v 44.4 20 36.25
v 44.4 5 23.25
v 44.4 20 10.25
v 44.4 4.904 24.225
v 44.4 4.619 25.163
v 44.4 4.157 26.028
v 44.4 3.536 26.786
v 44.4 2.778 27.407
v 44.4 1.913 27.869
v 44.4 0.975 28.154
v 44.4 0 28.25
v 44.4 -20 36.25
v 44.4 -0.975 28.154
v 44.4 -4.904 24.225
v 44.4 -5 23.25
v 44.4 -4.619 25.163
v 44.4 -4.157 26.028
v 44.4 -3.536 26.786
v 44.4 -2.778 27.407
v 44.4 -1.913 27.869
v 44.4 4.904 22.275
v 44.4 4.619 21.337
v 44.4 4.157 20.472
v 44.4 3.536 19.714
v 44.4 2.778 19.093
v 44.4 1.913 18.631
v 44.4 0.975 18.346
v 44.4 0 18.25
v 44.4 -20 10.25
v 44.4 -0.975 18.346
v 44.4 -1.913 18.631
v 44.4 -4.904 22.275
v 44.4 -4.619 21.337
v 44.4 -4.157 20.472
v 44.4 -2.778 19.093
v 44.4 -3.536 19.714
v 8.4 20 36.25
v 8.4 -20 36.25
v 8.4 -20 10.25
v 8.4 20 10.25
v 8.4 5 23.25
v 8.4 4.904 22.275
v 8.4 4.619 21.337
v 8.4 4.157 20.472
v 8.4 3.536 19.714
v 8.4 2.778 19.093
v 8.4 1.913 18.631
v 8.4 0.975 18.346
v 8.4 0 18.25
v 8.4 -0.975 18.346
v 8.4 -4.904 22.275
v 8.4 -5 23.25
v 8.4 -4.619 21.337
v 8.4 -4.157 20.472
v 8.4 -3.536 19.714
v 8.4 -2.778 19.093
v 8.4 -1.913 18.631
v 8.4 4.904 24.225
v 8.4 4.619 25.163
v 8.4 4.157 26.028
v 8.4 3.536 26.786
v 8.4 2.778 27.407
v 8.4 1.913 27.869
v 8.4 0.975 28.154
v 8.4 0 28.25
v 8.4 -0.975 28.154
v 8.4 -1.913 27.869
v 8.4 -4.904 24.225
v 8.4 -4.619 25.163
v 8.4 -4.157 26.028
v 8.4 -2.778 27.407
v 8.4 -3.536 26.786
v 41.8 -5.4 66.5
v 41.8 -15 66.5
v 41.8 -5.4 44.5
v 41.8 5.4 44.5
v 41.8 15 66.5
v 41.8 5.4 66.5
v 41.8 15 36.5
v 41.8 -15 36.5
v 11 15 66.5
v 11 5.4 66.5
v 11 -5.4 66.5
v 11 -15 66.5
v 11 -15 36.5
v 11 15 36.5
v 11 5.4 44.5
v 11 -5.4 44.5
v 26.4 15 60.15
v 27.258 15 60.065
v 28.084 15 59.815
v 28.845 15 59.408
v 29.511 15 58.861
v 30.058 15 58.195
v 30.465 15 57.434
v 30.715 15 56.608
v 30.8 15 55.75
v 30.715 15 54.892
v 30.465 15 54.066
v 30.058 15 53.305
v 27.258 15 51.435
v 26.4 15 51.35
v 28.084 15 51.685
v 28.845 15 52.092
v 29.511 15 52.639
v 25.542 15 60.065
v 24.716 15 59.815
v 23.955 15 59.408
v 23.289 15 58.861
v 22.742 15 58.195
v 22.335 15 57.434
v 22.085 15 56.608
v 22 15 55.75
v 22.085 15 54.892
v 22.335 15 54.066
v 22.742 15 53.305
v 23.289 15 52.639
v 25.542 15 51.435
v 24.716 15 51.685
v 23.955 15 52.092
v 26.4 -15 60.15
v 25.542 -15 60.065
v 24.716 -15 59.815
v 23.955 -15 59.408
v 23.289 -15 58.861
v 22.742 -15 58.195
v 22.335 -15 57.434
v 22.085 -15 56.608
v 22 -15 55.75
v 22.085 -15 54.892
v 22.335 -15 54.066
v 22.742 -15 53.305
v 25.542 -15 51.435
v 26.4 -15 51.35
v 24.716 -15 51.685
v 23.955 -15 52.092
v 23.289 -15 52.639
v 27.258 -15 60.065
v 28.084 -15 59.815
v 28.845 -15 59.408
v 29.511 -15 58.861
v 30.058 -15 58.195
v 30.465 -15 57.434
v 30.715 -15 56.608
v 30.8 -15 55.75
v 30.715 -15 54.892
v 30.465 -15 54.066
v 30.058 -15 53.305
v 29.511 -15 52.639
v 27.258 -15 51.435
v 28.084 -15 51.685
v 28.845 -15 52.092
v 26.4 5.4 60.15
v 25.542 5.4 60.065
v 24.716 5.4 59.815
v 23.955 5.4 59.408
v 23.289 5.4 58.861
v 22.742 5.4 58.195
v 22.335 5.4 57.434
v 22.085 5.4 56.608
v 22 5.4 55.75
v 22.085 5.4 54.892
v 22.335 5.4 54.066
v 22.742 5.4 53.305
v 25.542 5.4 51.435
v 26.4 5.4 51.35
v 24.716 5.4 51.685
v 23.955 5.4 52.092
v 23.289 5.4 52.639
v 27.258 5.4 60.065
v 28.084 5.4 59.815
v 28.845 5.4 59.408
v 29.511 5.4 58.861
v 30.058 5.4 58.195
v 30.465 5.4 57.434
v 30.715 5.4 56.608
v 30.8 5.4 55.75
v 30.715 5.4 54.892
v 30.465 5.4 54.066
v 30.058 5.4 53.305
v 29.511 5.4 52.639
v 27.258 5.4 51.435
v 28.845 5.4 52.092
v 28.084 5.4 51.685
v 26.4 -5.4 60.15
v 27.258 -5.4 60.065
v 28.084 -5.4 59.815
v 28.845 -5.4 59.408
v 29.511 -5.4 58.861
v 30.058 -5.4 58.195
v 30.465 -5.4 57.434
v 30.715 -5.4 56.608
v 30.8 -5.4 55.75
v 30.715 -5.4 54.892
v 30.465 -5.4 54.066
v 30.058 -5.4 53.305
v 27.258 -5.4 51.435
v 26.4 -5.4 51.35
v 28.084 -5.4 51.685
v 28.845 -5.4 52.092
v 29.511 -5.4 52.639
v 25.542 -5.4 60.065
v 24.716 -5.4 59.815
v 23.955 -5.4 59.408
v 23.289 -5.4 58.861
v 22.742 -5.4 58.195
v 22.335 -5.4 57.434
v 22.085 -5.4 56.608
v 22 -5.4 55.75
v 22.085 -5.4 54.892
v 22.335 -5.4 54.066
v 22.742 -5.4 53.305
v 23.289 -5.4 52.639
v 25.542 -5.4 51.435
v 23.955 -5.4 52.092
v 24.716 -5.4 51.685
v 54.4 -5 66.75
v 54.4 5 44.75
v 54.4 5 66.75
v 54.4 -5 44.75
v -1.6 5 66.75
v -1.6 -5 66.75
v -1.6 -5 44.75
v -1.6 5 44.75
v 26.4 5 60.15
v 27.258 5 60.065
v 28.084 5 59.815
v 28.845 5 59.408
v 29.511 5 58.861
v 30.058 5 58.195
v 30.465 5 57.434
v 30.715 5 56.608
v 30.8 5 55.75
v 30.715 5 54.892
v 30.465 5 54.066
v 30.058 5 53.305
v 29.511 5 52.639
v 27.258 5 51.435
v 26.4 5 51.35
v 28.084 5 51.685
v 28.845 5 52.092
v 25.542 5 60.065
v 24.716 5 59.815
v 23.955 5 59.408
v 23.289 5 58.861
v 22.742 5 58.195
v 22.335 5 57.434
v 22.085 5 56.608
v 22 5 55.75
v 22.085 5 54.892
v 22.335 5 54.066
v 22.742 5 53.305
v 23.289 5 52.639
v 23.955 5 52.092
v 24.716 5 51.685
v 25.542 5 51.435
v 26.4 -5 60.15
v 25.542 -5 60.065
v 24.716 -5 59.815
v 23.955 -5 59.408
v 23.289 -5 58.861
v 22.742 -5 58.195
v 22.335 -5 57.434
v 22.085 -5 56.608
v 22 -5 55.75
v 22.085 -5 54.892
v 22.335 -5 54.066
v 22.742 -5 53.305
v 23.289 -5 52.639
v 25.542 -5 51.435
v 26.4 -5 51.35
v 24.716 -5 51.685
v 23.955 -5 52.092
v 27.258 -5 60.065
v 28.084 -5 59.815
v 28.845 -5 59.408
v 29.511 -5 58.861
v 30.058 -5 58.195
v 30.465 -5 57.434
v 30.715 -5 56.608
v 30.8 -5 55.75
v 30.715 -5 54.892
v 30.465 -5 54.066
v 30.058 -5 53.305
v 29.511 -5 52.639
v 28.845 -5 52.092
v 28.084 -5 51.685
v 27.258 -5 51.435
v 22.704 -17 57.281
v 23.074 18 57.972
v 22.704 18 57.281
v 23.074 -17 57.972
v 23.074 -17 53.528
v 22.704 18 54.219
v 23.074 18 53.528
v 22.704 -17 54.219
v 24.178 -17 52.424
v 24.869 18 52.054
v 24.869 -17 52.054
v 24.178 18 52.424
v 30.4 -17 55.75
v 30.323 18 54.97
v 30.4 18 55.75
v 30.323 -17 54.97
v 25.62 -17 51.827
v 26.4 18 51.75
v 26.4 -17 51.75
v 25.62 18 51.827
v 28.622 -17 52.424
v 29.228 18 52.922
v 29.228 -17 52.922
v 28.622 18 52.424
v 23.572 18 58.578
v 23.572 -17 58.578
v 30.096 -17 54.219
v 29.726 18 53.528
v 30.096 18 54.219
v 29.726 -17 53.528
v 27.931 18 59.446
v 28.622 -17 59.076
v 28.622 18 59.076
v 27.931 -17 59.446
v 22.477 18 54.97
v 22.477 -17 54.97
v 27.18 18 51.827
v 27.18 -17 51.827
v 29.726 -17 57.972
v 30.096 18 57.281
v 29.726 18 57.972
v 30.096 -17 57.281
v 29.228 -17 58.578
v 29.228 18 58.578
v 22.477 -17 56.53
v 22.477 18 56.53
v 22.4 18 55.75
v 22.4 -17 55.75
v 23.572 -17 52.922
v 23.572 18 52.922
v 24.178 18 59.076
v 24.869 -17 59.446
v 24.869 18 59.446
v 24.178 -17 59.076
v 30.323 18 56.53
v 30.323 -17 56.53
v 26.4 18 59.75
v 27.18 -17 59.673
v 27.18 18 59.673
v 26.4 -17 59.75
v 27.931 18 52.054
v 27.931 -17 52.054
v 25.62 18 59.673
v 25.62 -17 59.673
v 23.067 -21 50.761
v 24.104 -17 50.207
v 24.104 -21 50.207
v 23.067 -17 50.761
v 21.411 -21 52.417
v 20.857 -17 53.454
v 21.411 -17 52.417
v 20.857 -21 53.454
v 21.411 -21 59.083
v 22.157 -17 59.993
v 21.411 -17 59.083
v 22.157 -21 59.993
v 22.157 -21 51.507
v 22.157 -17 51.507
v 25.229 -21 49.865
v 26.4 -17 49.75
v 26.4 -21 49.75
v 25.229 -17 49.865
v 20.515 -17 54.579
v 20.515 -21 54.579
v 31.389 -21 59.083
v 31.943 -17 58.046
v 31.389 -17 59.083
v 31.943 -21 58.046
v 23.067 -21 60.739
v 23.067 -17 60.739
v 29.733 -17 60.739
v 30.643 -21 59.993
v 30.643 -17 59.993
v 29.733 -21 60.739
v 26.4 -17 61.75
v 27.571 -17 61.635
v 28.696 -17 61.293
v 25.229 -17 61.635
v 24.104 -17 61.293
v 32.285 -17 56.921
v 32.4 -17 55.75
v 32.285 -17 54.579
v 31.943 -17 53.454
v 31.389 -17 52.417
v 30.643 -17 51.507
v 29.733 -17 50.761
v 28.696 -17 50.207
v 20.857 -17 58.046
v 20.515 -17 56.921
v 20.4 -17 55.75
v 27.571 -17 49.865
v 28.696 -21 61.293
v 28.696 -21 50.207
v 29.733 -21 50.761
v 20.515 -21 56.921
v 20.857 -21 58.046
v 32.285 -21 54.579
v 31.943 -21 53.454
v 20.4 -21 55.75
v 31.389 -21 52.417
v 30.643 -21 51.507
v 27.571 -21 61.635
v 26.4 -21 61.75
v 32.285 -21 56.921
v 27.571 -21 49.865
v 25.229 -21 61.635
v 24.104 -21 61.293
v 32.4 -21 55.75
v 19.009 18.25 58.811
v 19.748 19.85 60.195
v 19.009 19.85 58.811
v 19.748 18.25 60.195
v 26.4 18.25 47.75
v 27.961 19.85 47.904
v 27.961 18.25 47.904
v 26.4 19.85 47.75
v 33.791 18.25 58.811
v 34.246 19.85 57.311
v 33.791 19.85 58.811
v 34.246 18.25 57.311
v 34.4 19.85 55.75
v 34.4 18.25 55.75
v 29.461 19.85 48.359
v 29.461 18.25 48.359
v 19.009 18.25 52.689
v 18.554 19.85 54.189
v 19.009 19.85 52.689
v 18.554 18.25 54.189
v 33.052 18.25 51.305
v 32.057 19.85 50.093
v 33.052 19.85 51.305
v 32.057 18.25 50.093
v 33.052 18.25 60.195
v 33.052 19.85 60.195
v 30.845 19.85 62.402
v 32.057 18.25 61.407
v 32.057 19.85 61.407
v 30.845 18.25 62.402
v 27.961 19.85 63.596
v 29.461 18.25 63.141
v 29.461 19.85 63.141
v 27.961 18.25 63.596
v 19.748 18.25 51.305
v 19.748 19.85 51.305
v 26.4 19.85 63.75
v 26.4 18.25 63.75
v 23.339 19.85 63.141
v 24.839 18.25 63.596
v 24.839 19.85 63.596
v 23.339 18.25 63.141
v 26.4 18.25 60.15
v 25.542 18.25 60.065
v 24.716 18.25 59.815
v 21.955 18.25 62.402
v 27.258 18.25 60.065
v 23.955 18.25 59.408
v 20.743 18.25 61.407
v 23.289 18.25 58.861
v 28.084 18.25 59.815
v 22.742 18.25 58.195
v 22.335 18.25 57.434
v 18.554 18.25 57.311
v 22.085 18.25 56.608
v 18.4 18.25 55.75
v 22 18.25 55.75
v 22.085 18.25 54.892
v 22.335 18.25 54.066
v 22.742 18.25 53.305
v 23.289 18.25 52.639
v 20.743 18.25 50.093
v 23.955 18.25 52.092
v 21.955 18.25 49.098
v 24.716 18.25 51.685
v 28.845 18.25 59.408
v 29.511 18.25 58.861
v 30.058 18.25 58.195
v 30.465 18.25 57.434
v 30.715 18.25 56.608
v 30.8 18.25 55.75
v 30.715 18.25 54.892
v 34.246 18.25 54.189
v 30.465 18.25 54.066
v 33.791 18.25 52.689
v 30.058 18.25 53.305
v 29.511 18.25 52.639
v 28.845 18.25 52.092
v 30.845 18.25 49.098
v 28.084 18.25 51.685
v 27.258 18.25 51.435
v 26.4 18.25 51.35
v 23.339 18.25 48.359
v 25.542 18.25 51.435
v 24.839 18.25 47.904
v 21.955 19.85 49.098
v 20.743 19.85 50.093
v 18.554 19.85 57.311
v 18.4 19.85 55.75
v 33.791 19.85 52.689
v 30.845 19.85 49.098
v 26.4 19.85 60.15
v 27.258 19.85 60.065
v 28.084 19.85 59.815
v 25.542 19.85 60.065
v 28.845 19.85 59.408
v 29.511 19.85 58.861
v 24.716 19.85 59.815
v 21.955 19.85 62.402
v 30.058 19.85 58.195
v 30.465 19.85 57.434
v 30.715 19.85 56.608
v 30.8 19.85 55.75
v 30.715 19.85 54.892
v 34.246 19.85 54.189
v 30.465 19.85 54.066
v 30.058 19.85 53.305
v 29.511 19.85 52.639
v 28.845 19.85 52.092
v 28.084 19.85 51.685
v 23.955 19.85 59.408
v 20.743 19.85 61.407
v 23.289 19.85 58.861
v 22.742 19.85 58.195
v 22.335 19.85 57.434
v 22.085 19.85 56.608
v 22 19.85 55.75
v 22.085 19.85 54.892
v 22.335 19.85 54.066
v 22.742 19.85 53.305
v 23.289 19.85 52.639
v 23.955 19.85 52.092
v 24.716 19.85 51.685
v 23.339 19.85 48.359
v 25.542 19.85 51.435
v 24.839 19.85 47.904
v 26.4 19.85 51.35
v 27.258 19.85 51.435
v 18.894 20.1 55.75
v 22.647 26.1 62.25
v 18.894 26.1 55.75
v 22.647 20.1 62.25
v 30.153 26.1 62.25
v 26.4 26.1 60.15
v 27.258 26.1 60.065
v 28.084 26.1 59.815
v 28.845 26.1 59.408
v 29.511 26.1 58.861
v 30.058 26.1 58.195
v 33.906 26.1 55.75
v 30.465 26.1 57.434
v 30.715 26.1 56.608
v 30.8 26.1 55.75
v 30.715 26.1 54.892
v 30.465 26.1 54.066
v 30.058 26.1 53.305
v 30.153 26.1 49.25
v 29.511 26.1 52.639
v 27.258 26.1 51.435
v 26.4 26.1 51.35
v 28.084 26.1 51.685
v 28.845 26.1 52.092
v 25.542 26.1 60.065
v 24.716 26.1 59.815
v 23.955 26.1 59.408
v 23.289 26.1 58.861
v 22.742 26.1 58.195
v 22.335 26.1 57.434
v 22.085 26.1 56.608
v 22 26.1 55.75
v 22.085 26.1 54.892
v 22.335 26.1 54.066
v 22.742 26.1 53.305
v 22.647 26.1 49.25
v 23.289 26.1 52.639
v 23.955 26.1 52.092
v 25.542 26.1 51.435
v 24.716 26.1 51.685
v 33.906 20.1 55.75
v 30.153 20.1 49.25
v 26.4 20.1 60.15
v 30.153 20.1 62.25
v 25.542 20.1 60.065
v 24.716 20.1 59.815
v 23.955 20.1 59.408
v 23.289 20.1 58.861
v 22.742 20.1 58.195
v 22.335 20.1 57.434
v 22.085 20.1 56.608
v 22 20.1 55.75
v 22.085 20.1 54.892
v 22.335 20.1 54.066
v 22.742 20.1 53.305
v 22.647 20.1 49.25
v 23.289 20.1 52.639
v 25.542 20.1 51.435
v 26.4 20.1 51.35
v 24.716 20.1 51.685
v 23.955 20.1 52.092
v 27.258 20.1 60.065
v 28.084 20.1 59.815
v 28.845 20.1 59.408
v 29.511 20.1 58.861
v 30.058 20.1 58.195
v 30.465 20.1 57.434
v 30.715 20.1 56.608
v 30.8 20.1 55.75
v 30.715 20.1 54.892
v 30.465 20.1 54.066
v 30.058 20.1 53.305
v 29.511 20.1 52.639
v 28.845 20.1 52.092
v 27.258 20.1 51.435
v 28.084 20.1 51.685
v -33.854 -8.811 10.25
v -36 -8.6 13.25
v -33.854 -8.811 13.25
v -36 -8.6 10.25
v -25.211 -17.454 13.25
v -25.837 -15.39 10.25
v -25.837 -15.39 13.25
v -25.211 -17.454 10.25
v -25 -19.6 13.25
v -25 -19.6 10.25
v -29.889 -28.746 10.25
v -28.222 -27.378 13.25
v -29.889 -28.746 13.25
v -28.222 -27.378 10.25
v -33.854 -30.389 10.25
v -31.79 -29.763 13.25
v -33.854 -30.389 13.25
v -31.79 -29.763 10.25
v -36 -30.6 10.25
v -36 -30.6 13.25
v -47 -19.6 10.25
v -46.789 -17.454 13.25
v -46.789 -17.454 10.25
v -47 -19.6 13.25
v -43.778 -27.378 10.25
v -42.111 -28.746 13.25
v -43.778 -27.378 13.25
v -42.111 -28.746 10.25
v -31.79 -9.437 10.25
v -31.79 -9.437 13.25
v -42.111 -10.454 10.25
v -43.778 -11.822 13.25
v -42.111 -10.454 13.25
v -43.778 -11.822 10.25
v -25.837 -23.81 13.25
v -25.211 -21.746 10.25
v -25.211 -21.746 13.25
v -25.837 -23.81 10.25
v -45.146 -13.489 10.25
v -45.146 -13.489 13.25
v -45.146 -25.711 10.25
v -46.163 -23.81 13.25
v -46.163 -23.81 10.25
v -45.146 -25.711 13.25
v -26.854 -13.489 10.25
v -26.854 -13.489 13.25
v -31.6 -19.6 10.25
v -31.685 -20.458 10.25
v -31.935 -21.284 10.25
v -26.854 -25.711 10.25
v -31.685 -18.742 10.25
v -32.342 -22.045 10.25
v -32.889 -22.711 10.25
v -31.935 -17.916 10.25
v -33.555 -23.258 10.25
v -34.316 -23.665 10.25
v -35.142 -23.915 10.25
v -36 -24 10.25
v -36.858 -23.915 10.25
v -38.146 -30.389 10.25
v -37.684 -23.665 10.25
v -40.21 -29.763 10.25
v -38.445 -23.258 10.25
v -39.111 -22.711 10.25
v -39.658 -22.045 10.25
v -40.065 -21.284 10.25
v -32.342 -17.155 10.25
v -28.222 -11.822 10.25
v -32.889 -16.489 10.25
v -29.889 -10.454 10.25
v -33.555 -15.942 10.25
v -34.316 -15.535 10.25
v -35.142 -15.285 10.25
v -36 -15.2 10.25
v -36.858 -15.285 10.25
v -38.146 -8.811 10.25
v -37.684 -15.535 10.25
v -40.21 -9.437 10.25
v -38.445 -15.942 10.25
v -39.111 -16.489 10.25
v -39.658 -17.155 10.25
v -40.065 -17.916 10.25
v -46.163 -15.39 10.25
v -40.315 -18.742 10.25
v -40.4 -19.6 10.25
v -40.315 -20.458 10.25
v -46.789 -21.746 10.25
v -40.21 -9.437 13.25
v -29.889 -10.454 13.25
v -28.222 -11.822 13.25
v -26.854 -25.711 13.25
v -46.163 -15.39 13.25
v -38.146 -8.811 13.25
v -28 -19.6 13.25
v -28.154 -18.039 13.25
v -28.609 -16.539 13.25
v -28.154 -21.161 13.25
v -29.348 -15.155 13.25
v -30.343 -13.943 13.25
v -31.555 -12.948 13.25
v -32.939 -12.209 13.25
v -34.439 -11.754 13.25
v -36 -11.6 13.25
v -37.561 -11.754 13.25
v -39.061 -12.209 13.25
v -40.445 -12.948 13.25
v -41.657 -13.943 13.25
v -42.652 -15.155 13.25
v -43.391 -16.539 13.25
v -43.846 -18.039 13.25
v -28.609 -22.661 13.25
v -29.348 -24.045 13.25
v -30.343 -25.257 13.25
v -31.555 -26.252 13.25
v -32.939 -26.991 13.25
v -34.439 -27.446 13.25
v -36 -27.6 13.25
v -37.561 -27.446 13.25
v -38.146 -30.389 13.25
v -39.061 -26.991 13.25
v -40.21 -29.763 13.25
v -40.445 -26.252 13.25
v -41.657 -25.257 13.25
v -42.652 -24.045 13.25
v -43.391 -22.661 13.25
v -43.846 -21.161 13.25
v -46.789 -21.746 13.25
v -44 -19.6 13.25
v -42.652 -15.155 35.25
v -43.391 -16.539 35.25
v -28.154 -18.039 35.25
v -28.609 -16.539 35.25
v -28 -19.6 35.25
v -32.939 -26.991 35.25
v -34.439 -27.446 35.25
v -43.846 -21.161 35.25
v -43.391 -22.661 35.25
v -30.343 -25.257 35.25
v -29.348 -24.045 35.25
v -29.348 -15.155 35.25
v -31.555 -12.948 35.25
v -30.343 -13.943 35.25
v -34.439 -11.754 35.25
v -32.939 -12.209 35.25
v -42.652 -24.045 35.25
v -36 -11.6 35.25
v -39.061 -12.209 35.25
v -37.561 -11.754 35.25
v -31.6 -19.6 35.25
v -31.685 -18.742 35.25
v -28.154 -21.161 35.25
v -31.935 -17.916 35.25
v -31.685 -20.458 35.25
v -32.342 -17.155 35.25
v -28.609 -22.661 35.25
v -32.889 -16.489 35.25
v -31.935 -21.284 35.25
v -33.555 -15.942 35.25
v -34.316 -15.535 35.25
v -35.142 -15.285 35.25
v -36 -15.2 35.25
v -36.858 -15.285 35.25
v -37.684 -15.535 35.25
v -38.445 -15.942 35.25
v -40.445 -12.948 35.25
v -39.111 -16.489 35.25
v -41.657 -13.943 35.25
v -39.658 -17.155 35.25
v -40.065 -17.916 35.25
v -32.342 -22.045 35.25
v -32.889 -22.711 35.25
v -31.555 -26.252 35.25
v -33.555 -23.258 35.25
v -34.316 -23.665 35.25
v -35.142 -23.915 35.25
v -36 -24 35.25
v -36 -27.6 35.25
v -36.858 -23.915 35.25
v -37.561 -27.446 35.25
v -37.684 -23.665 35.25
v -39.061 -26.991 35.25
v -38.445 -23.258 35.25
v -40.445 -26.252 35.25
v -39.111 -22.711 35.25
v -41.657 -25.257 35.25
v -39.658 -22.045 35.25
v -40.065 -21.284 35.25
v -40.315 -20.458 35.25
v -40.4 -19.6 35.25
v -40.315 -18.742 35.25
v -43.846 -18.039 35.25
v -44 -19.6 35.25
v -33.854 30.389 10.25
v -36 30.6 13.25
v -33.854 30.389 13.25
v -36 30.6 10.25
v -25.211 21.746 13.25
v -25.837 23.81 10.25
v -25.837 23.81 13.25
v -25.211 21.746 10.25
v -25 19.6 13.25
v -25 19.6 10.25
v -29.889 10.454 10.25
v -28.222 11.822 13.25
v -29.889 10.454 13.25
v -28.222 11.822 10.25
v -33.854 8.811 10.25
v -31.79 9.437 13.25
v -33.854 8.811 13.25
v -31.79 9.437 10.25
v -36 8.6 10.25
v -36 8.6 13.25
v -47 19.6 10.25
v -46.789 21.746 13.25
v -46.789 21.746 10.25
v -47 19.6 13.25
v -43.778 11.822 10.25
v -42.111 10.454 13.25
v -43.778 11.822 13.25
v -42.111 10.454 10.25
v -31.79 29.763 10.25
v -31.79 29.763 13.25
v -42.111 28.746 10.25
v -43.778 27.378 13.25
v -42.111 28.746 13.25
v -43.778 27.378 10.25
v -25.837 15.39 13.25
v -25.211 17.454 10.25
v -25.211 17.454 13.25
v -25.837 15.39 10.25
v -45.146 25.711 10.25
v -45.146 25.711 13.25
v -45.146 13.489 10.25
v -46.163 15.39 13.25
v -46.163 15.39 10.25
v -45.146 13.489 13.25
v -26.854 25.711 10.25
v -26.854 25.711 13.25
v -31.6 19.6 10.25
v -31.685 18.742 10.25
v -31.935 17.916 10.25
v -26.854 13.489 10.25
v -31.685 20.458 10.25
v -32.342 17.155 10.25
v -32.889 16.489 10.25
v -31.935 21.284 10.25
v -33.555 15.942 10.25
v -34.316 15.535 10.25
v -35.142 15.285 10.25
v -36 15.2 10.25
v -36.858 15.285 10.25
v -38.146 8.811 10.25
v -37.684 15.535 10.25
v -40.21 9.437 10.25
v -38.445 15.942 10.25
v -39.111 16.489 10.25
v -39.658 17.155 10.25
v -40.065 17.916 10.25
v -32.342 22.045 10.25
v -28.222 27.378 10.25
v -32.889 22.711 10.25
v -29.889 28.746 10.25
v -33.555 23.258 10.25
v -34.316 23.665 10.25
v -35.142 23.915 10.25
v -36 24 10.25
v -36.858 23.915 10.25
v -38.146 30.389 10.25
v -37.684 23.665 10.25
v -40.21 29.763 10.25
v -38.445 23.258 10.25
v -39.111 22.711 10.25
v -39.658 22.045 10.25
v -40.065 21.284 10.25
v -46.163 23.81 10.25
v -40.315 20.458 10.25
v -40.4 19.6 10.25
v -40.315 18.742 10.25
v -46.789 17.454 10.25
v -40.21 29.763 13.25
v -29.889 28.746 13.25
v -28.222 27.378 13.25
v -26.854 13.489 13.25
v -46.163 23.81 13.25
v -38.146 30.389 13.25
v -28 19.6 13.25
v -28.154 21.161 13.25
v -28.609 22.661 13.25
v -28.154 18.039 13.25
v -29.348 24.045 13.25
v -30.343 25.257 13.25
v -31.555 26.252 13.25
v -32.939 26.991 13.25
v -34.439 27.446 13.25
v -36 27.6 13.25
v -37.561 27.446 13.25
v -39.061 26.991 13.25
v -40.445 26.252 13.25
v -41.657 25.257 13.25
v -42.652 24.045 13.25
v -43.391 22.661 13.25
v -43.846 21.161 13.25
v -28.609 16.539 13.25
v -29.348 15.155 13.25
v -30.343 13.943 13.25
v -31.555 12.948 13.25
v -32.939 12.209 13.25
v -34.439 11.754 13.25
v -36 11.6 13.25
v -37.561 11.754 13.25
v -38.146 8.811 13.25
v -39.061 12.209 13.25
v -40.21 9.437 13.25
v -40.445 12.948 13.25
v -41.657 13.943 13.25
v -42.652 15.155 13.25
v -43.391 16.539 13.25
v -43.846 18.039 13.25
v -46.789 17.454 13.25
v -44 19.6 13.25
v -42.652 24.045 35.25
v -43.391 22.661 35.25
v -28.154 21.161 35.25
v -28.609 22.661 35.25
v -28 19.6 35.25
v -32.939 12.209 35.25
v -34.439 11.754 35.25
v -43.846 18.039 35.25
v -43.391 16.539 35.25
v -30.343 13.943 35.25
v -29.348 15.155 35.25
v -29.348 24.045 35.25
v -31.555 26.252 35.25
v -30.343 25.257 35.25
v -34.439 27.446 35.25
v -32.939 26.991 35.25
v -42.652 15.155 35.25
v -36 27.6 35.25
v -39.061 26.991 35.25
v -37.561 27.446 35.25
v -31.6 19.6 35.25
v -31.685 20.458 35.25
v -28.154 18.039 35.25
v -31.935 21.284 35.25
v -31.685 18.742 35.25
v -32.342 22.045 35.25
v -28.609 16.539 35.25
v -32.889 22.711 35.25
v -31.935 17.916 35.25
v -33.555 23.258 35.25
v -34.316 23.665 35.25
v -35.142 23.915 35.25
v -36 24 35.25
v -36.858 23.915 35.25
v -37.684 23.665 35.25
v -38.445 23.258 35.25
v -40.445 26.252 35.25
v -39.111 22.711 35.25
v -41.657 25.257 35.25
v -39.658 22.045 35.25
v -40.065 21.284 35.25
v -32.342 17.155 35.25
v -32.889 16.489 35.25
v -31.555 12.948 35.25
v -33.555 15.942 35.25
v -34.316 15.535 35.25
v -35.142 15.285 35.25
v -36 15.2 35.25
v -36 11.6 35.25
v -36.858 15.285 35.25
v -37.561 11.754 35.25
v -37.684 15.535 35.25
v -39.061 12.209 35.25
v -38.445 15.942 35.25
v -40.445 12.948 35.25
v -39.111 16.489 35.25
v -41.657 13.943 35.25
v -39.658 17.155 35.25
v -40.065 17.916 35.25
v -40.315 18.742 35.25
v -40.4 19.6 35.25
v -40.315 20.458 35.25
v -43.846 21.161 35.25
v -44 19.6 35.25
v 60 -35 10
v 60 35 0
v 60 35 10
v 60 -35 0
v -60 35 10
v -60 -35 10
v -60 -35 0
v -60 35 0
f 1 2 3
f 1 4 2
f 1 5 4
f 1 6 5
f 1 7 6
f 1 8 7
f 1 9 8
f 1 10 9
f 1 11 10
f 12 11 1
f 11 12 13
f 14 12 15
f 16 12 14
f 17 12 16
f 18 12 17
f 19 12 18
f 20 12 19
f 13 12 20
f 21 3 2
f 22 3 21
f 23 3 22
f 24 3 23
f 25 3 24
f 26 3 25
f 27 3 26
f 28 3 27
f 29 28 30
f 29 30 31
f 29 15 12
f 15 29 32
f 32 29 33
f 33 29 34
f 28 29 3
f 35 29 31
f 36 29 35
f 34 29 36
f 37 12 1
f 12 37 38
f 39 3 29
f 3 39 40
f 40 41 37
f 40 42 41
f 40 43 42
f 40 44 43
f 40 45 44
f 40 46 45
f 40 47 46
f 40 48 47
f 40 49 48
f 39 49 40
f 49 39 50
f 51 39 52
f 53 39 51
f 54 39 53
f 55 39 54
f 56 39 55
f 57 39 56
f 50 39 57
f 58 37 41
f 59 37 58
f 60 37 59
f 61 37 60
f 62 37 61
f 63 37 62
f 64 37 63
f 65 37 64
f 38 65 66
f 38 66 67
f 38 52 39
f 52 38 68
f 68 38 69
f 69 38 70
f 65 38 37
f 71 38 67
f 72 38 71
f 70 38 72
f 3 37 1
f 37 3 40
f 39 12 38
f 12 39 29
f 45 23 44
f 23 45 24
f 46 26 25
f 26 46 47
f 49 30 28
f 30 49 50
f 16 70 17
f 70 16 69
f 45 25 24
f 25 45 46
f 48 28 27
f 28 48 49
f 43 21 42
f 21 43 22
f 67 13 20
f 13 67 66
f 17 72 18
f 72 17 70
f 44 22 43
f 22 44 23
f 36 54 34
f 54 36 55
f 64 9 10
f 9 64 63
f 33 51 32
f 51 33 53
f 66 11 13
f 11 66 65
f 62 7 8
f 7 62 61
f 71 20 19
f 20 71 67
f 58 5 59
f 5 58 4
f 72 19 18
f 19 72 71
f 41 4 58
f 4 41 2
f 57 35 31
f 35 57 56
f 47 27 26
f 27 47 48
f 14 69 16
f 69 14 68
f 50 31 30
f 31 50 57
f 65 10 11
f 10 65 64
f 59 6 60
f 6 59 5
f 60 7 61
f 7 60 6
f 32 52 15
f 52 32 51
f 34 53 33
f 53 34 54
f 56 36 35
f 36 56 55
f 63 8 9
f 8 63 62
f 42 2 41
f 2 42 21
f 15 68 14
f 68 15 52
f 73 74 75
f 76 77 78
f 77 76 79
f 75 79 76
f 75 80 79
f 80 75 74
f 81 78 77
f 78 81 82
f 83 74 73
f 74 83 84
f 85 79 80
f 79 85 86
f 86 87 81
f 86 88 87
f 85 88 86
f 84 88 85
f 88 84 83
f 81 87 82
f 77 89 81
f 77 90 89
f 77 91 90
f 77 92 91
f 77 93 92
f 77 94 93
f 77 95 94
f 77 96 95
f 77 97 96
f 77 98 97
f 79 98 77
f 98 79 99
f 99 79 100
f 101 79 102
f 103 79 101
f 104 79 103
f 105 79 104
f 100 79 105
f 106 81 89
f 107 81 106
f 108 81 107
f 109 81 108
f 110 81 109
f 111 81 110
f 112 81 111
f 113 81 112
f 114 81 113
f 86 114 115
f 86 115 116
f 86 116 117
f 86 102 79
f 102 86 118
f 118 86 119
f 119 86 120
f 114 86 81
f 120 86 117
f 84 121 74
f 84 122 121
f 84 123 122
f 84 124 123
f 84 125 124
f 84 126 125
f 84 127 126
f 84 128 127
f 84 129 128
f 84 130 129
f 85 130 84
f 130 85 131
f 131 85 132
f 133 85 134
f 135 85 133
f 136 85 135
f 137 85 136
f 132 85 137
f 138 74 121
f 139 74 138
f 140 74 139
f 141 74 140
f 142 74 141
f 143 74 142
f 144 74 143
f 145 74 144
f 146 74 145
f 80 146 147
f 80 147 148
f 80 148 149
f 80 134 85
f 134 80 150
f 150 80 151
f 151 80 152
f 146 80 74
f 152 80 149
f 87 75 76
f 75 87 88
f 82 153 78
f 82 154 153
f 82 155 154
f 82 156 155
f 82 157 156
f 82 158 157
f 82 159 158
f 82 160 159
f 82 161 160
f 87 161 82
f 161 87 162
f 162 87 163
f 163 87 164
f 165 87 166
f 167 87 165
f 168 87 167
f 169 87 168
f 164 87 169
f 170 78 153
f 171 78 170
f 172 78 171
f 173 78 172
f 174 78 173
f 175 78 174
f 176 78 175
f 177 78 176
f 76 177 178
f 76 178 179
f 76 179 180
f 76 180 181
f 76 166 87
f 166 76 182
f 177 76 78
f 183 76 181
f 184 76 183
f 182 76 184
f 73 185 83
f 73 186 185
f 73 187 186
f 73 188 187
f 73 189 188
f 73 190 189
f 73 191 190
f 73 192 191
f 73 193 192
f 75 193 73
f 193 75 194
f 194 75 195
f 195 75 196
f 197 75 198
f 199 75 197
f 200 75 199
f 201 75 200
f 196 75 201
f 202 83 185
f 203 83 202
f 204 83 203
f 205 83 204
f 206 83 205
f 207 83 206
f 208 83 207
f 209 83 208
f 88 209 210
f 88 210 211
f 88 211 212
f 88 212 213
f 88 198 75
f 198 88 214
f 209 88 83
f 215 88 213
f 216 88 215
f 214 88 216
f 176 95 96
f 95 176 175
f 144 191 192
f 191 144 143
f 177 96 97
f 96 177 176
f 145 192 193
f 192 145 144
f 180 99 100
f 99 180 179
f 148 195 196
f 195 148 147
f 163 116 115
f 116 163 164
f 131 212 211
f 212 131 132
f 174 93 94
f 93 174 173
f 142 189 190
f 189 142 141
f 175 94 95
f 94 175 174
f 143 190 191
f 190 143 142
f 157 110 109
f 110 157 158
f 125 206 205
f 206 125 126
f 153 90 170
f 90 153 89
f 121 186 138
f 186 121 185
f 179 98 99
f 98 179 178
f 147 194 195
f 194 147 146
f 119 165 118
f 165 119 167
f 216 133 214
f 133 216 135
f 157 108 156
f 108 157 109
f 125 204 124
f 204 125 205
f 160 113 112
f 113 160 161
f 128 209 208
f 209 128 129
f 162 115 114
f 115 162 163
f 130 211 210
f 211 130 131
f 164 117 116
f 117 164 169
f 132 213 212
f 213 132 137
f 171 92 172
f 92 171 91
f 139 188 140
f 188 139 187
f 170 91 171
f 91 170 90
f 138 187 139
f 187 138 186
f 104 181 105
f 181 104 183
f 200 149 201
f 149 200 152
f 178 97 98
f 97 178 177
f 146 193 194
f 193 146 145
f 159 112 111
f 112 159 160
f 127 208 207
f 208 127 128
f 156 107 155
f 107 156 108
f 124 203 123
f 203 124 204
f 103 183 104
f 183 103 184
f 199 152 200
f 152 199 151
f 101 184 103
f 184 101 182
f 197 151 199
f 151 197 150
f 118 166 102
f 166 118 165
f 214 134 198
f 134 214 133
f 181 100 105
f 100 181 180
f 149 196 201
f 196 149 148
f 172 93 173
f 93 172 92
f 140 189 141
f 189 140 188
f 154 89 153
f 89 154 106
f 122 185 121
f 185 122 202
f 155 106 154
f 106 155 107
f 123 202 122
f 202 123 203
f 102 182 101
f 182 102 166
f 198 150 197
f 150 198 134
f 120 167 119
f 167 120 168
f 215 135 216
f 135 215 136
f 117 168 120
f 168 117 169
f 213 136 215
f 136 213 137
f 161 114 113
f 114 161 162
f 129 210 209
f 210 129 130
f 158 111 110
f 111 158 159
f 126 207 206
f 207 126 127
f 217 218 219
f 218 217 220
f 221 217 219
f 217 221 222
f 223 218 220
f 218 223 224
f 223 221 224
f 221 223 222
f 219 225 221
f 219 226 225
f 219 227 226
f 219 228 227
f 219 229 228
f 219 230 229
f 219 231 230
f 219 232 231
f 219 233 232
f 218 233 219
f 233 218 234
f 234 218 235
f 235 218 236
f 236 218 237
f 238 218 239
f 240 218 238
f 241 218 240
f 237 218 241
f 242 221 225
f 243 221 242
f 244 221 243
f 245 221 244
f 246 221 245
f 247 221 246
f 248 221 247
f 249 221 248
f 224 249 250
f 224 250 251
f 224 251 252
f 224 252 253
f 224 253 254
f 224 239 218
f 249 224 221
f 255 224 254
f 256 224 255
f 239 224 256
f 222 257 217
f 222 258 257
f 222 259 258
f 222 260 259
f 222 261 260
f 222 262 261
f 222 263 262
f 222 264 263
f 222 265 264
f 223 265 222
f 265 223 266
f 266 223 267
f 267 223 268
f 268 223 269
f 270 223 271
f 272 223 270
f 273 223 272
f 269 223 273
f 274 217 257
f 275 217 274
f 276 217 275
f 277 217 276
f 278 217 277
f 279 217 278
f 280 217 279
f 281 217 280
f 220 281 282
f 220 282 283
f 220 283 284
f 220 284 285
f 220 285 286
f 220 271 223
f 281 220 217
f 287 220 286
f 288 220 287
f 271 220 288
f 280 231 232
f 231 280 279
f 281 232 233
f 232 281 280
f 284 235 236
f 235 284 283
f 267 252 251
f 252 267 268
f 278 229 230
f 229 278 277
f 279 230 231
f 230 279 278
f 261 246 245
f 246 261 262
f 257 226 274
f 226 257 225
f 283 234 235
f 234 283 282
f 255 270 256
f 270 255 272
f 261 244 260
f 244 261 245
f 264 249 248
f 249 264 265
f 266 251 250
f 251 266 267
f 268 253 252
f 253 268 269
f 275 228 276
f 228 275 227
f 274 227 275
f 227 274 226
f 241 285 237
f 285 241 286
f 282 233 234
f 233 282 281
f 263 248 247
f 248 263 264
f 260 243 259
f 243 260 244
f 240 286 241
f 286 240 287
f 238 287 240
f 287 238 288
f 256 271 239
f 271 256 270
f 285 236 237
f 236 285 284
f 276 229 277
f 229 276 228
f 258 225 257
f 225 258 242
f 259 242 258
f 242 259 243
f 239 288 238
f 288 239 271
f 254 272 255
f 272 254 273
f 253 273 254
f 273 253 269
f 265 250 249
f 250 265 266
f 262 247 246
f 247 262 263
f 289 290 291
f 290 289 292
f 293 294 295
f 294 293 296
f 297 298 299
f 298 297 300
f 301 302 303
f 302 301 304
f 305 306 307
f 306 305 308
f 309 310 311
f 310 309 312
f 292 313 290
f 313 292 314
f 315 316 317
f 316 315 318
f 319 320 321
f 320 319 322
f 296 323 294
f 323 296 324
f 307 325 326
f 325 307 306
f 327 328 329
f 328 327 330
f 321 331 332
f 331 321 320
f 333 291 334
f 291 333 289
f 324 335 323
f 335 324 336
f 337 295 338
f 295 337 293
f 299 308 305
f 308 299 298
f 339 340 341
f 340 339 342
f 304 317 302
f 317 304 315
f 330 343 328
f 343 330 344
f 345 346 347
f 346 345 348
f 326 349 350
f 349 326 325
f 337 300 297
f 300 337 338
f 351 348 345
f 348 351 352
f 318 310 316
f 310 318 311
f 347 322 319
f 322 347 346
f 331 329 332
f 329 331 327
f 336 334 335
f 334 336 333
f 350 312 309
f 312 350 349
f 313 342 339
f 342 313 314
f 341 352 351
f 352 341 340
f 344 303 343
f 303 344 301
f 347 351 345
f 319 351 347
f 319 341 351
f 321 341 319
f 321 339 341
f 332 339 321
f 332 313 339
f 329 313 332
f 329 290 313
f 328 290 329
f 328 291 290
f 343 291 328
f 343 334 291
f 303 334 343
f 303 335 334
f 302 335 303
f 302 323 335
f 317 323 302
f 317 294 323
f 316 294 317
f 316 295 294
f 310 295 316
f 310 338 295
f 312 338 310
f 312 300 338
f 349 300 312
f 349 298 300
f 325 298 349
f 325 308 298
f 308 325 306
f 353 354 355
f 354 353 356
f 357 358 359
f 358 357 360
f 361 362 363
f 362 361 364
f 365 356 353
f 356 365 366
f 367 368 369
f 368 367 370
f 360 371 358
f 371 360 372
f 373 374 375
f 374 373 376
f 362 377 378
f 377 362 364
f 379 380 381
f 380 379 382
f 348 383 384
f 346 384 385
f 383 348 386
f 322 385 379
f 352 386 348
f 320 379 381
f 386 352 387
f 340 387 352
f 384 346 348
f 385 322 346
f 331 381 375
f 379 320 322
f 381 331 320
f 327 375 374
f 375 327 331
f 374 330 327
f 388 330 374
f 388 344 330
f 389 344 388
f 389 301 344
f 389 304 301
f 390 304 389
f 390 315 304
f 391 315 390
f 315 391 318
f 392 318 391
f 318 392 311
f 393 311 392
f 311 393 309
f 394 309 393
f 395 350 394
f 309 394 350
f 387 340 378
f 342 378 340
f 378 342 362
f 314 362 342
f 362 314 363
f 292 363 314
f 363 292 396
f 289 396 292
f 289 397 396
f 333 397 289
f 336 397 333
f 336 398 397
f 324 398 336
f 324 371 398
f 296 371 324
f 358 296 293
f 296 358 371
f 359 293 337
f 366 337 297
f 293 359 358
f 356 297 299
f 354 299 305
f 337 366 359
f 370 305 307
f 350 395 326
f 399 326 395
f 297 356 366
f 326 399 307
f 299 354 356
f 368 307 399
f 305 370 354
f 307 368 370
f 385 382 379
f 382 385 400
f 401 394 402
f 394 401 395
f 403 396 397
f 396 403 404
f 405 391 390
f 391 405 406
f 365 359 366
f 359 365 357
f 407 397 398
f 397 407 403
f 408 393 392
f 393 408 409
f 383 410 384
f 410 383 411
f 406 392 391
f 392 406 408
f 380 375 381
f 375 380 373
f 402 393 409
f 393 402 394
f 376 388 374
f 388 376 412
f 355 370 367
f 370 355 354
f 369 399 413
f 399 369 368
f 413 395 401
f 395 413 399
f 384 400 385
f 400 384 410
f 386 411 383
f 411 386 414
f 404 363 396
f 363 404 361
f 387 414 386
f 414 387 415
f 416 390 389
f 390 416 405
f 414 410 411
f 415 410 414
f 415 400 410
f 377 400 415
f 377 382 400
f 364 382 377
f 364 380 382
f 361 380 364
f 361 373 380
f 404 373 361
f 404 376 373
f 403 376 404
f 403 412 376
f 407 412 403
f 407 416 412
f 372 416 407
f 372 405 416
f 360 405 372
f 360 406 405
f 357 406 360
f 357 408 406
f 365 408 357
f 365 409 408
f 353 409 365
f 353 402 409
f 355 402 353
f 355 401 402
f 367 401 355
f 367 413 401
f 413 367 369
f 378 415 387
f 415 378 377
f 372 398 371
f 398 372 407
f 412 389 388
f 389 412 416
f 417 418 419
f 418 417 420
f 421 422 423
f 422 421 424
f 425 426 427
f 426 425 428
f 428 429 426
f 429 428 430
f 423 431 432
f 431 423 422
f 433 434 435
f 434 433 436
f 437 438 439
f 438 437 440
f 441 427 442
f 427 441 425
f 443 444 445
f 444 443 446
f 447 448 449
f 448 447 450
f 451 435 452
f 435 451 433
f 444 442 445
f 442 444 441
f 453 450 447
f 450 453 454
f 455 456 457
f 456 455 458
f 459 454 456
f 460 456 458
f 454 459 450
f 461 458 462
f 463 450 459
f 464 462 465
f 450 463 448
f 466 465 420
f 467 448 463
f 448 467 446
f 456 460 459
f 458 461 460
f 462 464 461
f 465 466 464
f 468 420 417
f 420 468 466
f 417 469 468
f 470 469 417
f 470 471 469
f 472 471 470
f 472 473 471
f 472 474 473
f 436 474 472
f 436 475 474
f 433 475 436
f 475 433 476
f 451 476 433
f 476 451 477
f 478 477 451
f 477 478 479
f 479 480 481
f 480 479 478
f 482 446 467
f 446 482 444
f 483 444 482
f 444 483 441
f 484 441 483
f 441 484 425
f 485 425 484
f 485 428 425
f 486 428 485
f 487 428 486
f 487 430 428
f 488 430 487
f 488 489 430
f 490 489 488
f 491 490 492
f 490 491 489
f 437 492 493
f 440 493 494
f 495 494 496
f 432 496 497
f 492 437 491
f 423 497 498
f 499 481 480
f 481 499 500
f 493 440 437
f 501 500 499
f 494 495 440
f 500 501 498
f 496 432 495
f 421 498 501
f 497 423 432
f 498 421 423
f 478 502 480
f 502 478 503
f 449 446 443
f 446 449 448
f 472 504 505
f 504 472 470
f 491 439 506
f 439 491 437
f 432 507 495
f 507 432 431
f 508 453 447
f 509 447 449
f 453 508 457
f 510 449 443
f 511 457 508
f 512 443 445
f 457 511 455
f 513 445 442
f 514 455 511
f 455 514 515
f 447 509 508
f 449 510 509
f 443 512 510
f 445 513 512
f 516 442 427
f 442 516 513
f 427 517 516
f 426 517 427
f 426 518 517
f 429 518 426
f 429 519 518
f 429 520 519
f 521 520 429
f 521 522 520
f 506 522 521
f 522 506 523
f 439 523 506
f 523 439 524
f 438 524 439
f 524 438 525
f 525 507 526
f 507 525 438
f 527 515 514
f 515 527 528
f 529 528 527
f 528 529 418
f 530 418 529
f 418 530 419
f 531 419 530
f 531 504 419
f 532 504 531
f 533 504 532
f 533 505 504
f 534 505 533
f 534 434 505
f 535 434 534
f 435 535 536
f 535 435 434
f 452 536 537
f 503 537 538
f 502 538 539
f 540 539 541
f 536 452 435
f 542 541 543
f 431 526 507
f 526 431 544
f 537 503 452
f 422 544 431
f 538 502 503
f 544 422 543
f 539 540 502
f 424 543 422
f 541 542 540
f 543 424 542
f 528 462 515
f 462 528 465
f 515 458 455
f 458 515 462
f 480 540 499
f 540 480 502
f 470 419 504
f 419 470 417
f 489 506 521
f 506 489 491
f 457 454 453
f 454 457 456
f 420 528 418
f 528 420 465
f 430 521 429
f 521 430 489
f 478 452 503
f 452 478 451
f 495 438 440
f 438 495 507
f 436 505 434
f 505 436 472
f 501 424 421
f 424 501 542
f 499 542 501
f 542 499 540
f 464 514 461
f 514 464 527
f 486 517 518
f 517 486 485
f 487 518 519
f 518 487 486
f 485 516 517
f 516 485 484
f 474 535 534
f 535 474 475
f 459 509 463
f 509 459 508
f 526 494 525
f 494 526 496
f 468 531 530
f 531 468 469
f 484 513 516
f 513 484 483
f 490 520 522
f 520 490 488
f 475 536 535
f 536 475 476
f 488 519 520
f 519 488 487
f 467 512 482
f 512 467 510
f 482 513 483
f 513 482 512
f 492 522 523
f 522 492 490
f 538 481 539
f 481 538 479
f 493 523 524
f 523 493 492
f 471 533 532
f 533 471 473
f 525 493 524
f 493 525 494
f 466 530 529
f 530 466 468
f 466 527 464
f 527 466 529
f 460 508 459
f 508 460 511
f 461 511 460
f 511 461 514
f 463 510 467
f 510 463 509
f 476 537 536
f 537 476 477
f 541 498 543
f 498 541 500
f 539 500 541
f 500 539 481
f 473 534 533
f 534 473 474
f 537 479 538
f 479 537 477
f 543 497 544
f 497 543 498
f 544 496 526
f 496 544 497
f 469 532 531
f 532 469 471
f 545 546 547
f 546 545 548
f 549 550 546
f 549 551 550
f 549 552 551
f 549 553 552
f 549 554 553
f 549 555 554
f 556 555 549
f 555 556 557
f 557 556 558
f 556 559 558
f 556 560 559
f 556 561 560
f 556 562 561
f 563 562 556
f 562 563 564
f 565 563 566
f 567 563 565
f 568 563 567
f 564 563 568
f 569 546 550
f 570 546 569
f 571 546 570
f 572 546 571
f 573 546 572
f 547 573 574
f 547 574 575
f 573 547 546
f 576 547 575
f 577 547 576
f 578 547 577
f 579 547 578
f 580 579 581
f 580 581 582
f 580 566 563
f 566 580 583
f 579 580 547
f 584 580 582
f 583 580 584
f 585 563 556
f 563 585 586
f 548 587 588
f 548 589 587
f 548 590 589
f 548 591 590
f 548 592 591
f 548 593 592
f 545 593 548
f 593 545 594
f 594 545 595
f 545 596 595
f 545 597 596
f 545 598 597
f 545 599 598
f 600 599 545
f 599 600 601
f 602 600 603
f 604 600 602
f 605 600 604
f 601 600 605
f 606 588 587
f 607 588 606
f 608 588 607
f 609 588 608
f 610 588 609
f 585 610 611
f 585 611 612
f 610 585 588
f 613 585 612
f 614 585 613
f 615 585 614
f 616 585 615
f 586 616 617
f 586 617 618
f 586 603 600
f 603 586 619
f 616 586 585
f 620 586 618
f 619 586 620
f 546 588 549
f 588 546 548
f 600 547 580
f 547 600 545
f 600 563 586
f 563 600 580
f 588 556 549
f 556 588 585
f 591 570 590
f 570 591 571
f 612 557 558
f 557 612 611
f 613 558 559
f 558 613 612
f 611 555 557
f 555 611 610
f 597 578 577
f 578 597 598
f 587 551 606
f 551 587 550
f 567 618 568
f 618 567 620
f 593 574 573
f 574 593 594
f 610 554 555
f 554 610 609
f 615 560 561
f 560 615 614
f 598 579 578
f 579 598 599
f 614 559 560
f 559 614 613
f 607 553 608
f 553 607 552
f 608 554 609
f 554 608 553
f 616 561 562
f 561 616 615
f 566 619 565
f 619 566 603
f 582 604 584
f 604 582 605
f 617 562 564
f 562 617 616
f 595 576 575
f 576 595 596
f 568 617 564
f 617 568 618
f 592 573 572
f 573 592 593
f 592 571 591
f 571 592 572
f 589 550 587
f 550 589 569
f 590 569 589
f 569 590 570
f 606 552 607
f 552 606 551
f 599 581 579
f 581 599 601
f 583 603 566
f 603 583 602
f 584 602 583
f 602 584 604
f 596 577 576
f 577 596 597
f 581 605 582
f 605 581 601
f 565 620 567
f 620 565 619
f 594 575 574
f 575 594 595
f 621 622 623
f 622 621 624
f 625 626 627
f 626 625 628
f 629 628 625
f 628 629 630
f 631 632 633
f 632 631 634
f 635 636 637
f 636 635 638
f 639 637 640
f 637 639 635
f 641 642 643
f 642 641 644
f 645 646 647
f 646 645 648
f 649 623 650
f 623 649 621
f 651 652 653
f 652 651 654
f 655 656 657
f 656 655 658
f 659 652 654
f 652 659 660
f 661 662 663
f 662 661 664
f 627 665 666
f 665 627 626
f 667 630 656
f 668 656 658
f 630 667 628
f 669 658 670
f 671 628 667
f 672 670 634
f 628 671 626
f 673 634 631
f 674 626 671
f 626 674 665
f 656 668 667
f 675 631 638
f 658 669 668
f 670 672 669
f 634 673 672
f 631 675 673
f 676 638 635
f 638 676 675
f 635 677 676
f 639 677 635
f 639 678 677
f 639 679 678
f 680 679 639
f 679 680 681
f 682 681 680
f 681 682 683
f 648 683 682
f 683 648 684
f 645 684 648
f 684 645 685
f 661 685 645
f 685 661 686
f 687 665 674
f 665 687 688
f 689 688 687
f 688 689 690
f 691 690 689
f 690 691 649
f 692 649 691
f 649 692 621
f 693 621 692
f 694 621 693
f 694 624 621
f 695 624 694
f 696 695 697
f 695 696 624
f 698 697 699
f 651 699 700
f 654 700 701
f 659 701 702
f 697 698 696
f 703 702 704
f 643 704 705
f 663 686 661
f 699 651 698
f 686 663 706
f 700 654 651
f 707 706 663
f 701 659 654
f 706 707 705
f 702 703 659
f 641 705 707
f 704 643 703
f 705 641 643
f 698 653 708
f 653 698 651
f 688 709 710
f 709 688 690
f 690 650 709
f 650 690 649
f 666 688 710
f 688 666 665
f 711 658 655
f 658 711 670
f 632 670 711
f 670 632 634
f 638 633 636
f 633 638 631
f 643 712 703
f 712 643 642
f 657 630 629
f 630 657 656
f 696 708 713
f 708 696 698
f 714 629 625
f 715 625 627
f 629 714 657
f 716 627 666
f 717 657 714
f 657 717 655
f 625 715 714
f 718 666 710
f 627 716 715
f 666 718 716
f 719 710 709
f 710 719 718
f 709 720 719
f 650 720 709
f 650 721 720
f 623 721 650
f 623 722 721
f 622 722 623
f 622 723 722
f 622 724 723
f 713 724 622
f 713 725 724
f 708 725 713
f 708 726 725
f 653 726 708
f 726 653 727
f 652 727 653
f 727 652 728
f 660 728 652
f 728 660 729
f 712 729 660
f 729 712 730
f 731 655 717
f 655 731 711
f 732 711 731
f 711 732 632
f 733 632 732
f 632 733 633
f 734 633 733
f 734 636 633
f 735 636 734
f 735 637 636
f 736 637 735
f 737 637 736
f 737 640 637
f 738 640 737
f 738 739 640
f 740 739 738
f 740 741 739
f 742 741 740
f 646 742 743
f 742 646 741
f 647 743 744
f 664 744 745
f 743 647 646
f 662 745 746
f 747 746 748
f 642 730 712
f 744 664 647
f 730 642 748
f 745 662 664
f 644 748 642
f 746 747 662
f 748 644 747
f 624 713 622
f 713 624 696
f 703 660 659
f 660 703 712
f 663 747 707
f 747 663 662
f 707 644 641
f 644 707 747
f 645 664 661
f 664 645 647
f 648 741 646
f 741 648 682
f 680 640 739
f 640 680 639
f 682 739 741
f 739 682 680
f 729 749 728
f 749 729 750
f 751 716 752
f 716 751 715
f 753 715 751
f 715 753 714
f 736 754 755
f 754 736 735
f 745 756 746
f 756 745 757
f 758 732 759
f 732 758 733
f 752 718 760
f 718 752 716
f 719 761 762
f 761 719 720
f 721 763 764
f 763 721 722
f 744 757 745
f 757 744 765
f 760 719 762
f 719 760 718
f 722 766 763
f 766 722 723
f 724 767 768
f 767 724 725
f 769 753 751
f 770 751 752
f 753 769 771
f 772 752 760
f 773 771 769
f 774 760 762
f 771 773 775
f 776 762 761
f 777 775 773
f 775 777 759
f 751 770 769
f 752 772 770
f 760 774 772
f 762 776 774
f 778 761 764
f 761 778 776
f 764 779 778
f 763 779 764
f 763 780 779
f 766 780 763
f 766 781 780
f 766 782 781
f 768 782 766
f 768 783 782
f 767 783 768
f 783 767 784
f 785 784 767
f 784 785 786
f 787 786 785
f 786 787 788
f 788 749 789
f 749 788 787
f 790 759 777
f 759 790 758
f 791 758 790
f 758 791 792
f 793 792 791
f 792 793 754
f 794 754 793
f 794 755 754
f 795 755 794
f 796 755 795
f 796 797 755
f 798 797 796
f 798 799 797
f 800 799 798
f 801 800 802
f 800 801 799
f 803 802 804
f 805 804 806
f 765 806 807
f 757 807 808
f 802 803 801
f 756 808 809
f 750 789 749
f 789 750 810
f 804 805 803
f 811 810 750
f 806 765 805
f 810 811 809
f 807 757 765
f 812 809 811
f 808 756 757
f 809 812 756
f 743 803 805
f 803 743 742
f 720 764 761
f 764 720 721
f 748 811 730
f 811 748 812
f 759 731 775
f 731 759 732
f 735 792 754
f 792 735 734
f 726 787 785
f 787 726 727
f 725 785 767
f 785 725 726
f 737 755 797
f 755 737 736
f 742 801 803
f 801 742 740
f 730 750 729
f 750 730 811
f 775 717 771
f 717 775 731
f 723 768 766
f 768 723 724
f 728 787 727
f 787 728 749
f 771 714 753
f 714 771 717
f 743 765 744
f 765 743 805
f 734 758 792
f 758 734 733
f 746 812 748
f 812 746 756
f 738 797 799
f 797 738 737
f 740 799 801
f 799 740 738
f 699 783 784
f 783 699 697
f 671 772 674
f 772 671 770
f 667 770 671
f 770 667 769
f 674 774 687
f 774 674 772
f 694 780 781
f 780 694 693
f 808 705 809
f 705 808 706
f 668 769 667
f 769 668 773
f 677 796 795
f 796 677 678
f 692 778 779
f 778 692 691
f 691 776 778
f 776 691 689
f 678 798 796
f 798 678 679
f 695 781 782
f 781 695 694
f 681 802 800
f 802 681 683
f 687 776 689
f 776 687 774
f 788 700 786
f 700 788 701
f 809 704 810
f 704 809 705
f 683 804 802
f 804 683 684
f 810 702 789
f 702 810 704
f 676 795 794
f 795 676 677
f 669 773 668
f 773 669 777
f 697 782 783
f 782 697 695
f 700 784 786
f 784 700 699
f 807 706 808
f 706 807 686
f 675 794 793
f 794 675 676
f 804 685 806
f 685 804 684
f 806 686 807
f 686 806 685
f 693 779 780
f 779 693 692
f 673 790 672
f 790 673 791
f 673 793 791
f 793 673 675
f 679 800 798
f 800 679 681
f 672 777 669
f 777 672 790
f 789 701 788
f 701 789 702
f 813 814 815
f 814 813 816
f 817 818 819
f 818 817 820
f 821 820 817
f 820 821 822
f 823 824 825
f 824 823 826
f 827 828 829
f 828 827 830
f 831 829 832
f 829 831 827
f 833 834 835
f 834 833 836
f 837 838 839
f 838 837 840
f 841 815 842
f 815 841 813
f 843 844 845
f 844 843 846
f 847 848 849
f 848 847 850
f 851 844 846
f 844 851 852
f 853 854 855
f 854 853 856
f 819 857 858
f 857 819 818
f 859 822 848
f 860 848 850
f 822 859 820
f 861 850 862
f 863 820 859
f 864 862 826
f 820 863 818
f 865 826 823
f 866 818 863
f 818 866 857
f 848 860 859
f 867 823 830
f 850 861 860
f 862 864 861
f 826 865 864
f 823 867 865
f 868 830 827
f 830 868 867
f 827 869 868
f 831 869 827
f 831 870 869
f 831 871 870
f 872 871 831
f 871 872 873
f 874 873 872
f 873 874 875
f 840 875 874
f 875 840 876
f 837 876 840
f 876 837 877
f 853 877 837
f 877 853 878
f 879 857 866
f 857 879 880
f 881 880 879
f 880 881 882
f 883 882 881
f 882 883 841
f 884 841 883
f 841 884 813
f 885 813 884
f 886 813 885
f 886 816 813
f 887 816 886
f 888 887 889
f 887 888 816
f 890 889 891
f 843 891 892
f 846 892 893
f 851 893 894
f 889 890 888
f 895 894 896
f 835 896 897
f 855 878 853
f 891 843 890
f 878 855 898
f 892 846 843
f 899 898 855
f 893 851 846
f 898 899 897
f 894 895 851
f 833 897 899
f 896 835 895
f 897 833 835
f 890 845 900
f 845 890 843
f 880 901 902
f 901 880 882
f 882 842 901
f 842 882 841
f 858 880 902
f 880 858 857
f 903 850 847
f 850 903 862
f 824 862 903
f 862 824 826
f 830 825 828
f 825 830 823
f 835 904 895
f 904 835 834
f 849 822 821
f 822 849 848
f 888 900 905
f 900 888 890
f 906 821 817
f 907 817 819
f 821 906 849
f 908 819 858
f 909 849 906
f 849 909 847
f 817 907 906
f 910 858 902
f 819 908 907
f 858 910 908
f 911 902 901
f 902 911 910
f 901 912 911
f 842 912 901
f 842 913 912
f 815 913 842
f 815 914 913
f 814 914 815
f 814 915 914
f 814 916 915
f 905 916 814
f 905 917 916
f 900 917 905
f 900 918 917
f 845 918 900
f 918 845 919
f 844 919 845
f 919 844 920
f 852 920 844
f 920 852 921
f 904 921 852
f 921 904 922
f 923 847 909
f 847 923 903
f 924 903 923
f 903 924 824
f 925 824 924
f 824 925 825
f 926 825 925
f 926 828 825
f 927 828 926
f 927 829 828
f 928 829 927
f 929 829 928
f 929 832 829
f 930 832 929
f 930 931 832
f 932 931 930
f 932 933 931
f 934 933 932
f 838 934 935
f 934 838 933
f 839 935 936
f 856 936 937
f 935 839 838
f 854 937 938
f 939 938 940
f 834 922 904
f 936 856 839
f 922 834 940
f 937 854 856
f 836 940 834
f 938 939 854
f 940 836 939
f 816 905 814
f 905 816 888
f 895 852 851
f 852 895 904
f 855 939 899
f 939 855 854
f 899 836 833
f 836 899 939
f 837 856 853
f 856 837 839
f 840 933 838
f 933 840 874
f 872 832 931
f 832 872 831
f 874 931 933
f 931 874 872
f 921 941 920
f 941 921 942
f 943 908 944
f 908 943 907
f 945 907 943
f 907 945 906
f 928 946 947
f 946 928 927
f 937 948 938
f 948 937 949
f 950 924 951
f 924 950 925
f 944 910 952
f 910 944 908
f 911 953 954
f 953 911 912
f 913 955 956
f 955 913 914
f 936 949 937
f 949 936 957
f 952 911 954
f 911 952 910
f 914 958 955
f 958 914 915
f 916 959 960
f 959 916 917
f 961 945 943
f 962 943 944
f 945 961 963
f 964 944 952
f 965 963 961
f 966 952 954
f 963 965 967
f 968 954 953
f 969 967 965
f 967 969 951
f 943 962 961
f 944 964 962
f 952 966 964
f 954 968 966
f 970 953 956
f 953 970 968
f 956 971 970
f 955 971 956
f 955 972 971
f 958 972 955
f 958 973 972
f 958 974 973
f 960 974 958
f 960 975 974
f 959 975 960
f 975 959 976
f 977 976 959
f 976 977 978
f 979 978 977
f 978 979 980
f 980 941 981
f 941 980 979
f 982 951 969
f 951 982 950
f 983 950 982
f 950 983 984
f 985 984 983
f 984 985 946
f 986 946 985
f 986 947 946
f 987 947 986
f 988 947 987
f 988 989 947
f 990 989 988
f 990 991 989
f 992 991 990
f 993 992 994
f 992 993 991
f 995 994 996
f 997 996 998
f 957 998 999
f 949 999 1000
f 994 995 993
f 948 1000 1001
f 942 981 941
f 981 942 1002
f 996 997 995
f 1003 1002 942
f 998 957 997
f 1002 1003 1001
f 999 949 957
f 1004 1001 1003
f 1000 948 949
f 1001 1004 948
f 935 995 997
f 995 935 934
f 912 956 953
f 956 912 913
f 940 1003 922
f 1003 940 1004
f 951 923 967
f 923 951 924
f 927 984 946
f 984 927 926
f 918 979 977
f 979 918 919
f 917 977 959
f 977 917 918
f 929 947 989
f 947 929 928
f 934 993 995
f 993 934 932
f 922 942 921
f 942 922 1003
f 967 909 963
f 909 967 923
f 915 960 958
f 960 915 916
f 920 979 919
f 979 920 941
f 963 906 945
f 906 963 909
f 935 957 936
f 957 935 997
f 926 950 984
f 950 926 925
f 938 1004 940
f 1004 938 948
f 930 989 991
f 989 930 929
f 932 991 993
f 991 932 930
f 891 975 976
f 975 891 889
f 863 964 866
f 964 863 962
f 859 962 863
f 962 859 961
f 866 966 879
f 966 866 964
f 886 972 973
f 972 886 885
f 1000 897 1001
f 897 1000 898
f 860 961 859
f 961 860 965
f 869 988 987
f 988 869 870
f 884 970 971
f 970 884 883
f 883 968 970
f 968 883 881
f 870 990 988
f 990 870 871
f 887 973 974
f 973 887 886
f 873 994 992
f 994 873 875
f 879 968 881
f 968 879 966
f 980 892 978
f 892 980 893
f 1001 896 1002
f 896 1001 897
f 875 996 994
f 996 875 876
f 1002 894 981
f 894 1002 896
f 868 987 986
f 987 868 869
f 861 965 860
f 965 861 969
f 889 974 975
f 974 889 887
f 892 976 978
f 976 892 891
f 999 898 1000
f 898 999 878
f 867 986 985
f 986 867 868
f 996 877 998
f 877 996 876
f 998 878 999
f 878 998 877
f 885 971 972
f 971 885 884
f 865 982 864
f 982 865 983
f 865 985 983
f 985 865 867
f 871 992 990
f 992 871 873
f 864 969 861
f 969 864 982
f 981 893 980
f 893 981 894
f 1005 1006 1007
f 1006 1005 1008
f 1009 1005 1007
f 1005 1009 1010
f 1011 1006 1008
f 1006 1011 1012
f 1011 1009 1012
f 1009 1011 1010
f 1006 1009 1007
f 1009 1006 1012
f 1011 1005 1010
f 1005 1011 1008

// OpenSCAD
$fn = 32;

// ------------------------------------------------------------------------
// Indexing jig: plate 120 x 70 mm, pin d8
// Every part is its own module, assembly() places every instance.
// ------------------------------------------------------------------------

// --- part 1 ---
module jig_plate() {
  difference() {
    translate([-60, -35, 0]) cube([120, 70, 10]);
  }
}

// --- part 2 ---
module locator_block() {
  difference() {
    translate([-18, -20, 0]) cube([36, 40, 26]);
    translate([0, 0, 13]) rotate([0, 90, 0]) cylinder(h = 38, d = 10, center = true);
  }
}

// --- part 3 ---
module index_fork() {
  difference() {
    translate([-15.4, -15, 0]) cube([30.8, 30, 30]);
    translate([-16.4, -5.4, 8]) cube([32.8, 10.8, 23]);
    translate([0, 0, 19.25]) rotate([90, 0, 0]) cylinder(h = 32, d = 8.8, center = true);
  }
}

// --- part 4 ---
module index_arm() {
  difference() {
    translate([-28, -5, 0]) cube([56, 10, 22]);
    translate([0, 0, 11]) rotate([90, 0, 0]) cylinder(h = 12, d = 8.8, center = true);
  }
}

// --- part 5 ---
module index_pin() {
  rotate([0, 90, 0]) cylinder(h = 36, d = 8, center = true);
  translate([-21, 0, 0]) rotate([0, 90, 0]) cylinder(h = 4, d = 12);
}

// --- part 6 ---
module pin_washer() {
  difference() {
      translate([0, 0, 0]) cylinder(h = 1.6, d = 16);
      translate([0, 0, -1]) cylinder(h = 3.6, d = 8.8);
    }
}

// --- part 7 ---
module lock_nut() {
  difference() {
    linear_extrude(height = 6) polygon(points = [[7.506, 0], [3.753, 6.5], [-3.753, 6.5], [-7.506, 0], [-3.753, -6.5], [3.753, -6.5]]);
    translate([0, 0, -1]) cylinder(h = 8, d = 8.8);
  }
}

// --- part 8 ---
module guide_bush_a() {
  difference() {
    union() {
      cylinder(h = 3, d = 22);
      translate([0, 0, 3]) cylinder(h = 22, d = 16);
    }
    translate([0, 0, -1]) cylinder(h = 27, d = 8.8);
  }
}

// --- part 9 ---
module guide_bush_b() {
  difference() {
    union() {
      cylinder(h = 3, d = 22);
      translate([0, 0, 3]) cylinder(h = 22, d = 16);
    }
    translate([0, 0, -1]) cylinder(h = 27, d = 8.8);
  }
}

// --- assembly ---
module assembly() {
  color([0.80, 0.24, 0.20]) translate([0, 0, 0]) rotate([0, 0, 0]) jig_plate();
  color([0.20, 0.45, 0.75]) translate([26.4, 0, 10.25]) rotate([0, 0, 0]) locator_block();
  color([0.25, 0.62, 0.32]) translate([26.4, 0, 36.5]) rotate([0, 0, 0]) index_fork();
  color([0.92, 0.70, 0.18]) translate([26.4, 0, 44.75]) rotate([0, 0, 0]) index_arm();
  color([0.58, 0.35, 0.70]) translate([26.4, 0, 55.75]) rotate([0, 0, 90]) index_pin();
  color([0.16, 0.66, 0.66]) translate([26.4, 19.85, 55.75]) rotate([90, 0, 0]) pin_washer();
  color([0.85, 0.48, 0.18]) translate([26.4, 26.1, 55.75]) rotate([90, 0, 0]) lock_nut();
  color([0.55, 0.60, 0.65]) translate([-36, -19.6, 10.25]) rotate([0, 0, 0]) guide_bush_a();
  color([0.75, 0.30, 0.55]) translate([-36, 19.6, 10.25]) rotate([0, 0, 0]) guide_bush_b();
}

assembly();
